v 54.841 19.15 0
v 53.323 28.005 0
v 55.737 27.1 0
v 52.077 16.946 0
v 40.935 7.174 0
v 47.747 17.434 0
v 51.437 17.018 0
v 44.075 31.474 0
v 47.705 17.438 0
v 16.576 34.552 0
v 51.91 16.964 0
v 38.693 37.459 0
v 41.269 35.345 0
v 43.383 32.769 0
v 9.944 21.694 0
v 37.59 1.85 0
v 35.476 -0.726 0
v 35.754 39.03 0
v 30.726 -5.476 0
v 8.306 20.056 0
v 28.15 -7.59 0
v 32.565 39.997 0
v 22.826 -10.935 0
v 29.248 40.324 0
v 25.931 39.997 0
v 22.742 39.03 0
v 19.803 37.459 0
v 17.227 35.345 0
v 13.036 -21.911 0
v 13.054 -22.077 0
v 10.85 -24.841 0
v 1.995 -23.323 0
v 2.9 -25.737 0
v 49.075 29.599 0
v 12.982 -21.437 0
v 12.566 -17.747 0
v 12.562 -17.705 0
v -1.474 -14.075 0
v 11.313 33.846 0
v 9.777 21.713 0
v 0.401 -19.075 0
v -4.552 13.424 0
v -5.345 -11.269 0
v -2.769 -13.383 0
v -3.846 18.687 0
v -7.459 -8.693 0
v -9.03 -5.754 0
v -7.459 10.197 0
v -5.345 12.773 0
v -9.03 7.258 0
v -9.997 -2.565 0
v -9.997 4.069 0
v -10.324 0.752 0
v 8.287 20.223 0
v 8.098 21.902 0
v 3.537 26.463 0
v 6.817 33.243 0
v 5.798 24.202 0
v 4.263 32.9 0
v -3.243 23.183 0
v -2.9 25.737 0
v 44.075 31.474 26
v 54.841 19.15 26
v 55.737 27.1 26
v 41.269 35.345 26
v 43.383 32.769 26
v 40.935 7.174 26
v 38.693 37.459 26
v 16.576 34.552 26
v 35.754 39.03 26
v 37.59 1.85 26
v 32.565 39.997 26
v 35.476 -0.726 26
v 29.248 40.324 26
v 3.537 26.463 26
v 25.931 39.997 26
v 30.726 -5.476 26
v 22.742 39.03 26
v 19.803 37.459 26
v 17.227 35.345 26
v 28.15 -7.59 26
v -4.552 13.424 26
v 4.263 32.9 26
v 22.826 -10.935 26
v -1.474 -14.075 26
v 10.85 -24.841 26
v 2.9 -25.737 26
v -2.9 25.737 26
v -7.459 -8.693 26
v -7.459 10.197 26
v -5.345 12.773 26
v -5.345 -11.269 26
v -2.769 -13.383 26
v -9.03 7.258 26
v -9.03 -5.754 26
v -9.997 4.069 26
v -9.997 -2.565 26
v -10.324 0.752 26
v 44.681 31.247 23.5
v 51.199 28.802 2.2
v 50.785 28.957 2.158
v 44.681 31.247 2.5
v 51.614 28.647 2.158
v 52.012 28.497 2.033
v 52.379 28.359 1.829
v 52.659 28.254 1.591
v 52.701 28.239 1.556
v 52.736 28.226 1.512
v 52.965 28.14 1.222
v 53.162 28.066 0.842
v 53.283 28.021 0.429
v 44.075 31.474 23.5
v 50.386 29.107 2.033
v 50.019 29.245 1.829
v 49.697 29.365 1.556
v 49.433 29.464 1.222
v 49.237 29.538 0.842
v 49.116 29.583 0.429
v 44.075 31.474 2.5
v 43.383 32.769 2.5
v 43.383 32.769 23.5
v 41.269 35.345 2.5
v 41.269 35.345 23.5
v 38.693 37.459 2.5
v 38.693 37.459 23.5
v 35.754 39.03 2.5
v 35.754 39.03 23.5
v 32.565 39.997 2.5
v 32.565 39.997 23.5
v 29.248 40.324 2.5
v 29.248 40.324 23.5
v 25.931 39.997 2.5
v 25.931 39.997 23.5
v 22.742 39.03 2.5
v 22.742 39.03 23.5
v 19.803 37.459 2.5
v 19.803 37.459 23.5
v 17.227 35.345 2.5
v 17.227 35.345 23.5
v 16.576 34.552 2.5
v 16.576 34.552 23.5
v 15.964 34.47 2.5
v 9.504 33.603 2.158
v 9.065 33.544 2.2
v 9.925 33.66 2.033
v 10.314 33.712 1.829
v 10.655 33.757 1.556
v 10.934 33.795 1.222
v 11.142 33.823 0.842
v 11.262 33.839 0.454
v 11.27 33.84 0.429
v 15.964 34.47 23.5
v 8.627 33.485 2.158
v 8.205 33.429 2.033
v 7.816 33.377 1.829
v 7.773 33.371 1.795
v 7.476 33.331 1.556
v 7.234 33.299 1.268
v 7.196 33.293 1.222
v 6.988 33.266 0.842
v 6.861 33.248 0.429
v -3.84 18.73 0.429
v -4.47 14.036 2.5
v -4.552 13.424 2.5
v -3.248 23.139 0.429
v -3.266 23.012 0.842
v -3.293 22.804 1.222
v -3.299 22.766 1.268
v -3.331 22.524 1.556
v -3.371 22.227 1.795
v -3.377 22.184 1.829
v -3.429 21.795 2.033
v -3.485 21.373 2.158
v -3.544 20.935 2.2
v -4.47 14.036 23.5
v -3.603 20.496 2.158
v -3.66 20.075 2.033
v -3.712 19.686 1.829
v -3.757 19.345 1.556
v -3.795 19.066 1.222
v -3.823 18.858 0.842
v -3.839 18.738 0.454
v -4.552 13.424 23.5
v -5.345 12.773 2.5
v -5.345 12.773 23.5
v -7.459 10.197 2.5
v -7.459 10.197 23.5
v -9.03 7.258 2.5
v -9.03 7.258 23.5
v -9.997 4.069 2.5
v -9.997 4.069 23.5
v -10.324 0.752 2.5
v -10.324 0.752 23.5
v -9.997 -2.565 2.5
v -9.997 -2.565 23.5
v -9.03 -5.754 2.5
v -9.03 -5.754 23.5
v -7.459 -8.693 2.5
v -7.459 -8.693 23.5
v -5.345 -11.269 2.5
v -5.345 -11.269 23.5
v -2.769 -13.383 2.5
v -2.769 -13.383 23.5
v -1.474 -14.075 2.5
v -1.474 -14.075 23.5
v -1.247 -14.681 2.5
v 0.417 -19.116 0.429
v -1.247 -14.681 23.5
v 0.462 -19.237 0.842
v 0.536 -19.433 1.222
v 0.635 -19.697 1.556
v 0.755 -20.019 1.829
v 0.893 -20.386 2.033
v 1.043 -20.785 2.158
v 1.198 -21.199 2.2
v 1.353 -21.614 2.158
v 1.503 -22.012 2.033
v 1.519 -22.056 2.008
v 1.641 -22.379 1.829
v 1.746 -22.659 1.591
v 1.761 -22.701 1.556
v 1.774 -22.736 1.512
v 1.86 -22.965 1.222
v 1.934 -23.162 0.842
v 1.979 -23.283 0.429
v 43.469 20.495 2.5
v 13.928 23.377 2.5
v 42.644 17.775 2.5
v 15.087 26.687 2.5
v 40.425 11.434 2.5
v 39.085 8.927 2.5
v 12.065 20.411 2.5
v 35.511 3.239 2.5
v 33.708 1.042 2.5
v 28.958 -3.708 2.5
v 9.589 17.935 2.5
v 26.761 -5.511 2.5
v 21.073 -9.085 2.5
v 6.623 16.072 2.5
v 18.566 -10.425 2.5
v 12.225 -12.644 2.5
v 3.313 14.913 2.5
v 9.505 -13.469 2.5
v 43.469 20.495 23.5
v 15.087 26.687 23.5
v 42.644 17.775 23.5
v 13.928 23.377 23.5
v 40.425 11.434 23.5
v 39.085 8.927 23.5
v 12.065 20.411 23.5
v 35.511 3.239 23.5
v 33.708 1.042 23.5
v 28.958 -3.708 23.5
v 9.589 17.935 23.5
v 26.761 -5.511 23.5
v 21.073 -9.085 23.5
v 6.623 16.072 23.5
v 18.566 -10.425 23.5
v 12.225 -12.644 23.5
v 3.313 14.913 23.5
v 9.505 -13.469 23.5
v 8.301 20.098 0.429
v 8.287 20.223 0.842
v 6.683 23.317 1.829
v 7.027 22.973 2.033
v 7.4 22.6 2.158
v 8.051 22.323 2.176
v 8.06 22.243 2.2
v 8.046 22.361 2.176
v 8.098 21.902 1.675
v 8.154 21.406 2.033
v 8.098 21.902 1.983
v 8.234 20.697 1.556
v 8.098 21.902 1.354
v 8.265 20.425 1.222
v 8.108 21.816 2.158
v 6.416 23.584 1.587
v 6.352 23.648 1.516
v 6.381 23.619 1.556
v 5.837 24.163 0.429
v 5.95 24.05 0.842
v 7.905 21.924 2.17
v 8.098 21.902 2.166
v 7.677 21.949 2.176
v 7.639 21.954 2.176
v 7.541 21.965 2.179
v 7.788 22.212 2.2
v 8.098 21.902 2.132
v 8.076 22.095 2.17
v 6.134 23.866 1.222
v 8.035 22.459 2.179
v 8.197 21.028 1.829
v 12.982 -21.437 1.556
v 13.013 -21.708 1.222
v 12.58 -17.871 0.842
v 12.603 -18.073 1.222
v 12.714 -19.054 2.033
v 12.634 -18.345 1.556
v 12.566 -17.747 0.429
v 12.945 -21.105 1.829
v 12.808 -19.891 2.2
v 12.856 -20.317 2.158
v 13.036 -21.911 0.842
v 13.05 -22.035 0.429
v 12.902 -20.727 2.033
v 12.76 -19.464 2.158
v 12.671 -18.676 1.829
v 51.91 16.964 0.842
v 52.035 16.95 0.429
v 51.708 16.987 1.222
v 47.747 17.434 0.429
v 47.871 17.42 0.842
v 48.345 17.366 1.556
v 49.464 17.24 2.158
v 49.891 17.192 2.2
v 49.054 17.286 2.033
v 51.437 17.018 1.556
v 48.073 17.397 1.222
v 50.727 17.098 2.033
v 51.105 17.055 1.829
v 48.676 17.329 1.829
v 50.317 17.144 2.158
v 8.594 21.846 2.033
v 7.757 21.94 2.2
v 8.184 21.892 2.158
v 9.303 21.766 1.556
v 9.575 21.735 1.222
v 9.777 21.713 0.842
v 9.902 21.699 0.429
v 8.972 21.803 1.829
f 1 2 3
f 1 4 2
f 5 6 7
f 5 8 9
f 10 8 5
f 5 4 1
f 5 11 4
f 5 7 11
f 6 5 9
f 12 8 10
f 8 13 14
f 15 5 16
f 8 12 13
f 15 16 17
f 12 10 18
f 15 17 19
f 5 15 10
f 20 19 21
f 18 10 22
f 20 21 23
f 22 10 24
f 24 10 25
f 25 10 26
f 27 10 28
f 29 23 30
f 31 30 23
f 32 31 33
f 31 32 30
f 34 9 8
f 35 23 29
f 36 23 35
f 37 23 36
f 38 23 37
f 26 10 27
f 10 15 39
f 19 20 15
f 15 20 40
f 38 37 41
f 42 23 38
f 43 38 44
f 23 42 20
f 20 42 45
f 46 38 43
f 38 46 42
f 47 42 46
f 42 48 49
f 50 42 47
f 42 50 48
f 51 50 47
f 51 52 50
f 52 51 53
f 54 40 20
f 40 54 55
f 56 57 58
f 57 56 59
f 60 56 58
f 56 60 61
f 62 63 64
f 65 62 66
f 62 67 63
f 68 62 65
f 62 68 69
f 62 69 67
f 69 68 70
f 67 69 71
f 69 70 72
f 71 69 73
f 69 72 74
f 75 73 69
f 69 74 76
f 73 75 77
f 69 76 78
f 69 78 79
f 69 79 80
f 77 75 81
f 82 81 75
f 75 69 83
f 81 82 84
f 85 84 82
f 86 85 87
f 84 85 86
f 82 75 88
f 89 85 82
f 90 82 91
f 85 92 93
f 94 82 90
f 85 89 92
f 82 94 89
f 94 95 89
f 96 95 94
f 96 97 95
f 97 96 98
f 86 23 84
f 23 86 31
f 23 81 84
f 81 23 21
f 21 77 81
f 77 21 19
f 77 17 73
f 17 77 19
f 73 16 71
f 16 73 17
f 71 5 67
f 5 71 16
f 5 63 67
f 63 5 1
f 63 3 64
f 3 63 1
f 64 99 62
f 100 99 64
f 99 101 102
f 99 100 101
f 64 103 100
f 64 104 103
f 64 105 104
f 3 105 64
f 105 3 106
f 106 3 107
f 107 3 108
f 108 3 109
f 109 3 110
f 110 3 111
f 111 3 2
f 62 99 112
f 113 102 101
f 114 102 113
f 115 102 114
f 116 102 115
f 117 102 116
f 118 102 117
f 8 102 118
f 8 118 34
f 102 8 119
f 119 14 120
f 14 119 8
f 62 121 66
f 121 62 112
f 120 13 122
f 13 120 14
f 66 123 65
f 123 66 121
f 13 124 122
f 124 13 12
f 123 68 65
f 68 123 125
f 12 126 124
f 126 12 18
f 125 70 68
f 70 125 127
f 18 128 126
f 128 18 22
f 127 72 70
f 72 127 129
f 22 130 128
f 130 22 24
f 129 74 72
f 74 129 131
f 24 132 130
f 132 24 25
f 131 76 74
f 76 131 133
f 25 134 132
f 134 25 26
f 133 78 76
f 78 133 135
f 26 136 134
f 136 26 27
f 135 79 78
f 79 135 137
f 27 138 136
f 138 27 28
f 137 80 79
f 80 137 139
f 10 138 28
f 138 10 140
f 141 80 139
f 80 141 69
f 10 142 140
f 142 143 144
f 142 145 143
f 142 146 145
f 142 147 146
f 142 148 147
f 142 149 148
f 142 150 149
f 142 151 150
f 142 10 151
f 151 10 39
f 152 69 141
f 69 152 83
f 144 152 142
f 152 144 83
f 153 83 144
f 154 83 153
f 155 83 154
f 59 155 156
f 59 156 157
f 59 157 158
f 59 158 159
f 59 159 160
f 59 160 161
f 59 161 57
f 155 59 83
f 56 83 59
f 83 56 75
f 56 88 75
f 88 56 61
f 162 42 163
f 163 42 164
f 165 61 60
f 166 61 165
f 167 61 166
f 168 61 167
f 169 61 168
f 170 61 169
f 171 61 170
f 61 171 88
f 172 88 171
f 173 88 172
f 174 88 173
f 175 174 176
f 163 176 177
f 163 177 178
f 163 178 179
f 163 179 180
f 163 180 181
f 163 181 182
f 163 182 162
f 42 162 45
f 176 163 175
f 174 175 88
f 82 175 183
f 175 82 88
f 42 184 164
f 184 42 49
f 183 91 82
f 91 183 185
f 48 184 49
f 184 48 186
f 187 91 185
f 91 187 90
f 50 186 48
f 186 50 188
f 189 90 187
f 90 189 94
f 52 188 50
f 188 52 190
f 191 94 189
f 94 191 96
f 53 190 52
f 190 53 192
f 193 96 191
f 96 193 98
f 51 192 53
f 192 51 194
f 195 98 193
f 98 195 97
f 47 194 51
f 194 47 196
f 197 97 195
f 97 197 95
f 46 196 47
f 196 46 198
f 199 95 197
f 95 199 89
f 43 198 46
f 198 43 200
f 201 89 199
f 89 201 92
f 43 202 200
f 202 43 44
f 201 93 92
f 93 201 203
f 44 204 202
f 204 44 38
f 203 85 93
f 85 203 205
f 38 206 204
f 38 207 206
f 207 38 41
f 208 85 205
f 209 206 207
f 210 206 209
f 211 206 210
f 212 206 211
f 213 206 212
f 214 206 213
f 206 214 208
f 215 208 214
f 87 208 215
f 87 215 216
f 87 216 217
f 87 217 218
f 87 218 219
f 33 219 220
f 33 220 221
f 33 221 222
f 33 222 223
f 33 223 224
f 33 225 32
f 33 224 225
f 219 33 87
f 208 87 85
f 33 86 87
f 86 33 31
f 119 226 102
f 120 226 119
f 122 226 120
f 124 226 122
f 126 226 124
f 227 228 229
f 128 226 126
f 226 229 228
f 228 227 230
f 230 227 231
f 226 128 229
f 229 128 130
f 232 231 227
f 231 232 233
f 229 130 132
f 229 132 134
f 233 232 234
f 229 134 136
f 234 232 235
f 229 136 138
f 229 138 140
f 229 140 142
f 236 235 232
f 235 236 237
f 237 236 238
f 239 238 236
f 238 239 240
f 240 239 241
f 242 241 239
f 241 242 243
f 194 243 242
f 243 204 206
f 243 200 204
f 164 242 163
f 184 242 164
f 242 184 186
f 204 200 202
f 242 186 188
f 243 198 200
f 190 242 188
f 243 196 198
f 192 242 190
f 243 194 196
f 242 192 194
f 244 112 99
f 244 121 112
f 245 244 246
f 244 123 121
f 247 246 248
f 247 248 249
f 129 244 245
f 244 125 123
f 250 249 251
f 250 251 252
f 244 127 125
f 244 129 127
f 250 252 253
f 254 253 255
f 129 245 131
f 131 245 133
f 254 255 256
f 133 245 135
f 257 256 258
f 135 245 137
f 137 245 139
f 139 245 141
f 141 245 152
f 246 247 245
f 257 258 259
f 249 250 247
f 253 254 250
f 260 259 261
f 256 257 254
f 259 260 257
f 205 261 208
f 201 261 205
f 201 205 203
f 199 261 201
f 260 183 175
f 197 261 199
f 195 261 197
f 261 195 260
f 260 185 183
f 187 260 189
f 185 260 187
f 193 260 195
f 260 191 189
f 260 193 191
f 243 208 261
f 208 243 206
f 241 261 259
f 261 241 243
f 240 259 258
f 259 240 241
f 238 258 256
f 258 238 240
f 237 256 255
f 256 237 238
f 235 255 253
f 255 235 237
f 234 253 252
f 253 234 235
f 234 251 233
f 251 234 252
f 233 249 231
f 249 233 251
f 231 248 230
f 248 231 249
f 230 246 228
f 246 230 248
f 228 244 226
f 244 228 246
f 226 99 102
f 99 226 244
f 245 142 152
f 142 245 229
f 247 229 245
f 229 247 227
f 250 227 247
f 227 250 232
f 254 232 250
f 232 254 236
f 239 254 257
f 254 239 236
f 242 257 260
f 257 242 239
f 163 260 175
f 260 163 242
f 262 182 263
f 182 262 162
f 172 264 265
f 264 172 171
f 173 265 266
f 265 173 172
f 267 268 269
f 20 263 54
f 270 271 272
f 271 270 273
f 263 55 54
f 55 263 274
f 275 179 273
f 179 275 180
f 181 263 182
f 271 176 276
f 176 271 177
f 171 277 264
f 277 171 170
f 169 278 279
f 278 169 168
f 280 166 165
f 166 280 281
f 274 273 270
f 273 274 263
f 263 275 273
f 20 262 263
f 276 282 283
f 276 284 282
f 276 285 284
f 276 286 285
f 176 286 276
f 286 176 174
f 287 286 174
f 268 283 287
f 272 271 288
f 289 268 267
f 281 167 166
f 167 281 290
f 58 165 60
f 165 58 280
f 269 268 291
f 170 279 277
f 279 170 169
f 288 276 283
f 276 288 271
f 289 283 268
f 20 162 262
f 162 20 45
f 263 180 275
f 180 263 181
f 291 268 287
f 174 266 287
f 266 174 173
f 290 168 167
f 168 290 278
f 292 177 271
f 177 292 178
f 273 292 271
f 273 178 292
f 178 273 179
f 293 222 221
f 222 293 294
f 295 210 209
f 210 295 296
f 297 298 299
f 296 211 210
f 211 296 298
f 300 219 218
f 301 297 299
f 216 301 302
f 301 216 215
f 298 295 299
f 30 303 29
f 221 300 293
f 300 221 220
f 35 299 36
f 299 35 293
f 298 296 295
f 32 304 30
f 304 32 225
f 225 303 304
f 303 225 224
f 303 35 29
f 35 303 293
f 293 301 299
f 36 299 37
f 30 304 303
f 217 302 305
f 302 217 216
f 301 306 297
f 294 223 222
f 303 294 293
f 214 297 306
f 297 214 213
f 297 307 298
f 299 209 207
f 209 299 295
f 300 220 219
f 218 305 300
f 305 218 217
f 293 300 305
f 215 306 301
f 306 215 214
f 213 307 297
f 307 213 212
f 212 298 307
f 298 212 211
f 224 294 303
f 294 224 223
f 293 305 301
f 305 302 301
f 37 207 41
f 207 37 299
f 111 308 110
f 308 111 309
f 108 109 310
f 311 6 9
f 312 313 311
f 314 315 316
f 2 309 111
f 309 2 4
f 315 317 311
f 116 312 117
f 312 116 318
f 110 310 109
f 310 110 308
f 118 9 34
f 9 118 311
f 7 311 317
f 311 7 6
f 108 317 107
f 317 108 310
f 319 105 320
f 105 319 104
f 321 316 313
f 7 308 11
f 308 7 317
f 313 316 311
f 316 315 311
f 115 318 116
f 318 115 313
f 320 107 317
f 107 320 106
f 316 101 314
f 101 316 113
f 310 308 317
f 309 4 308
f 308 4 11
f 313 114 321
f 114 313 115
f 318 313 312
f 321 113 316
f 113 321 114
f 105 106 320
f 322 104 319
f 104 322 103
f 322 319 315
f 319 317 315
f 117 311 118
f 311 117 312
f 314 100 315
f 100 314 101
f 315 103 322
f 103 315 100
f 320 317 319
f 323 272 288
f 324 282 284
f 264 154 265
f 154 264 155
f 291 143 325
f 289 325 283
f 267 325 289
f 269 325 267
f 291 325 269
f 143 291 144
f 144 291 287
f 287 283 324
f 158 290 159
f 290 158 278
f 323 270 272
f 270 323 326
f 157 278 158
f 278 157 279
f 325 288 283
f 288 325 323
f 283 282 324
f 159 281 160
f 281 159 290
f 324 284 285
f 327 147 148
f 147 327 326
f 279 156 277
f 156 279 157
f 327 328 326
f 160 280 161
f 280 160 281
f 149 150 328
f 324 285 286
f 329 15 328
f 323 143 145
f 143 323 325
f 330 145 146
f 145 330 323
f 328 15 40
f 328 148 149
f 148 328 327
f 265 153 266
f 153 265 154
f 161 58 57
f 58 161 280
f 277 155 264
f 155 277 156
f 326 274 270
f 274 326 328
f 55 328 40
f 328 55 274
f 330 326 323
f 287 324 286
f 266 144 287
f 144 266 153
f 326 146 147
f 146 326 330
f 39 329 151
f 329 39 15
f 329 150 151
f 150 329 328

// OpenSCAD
$fn = 32;

// ----------------------------------------------------------------------
// Air duct: 34 mm duct, 2.5 mm wall, 26 mm across
// ----------------------------------------------------------------------

// --- parameters (mm) ---
duct_r = 17;              // duct core radius
duct_d = 34;              // duct core diameter
wall = 2.5;               // duct wall thickness
height = 26;              // duct width (extrusion height)
port_r = 25.9;            // port flange half width
port_d = 51.8;            // port flange width
port_t = 8;               // port flange thickness
bolt_d = 4.4;             // port bolt holes
bolt_offset = 21.2;       // bolt hole offset from the port axis

difference() {
  /* outer hull chain: tube with a flat flange plate at every port */
  linear_extrude(height = 26) {
    hull() {
      polygon([[2.9, -25.737], [-2.9, 25.737], [5.05, 26.633], [10.85, -24.841]]);
      translate([10.931, 1.232]) circle(r = 17);
    }
    hull() {
      translate([10.931, 1.232]) circle(r = 17);
      translate([6.676, 0.752]) circle(r = 17);
    }
    hull() {
      translate([6.676, 0.752]) circle(r = 17);
      translate([13.017, 2.971]) circle(r = 17);
    }
    hull() {
      translate([13.017, 2.971]) circle(r = 17);
      translate([18.705, 6.545]) circle(r = 17);
    }
    hull() {
      translate([18.705, 6.545]) circle(r = 17);
      translate([23.455, 11.295]) circle(r = 17);
    }
    hull() {
      translate([23.455, 11.295]) circle(r = 17);
      translate([27.029, 16.983]) circle(r = 17);
    }
    hull() {
      translate([27.029, 16.983]) circle(r = 17);
      translate([29.248, 23.324]) circle(r = 17);
    }
    hull() {
      translate([29.248, 23.324]) circle(r = 17);
      translate([28.768, 19.069]) circle(r = 17);
    }
    hull() {
      translate([28.768, 19.069]) circle(r = 17);
      polygon([[4.263, 32.9], [55.737, 27.1], [54.841, 19.15], [3.367, 24.95]]);
    }
  }
  /* air passage: the same chain inset by the wall, 5 mm proud of the ports */
  translate([0, 0, 2.5]) linear_extrude(height = 21) {
    hull() {
      translate([-4.969, -0.56]) circle(r = 14.5);
      translate([6.676, 0.752]) circle(r = 14.5);
    }
    hull() {
      translate([6.676, 0.752]) circle(r = 14.5);
      translate([13.017, 2.971]) circle(r = 14.5);
    }
    hull() {
      translate([13.017, 2.971]) circle(r = 14.5);
      translate([18.705, 6.545]) circle(r = 14.5);
    }
    hull() {
      translate([18.705, 6.545]) circle(r = 14.5);
      translate([23.455, 11.295]) circle(r = 14.5);
    }
    hull() {
      translate([23.455, 11.295]) circle(r = 14.5);
      translate([27.029, 16.983]) circle(r = 14.5);
    }
    hull() {
      translate([27.029, 16.983]) circle(r = 14.5);
      translate([29.248, 23.324]) circle(r = 14.5);
    }
    hull() {
      translate([29.248, 23.324]) circle(r = 14.5);
      translate([30.56, 34.969]) circle(r = 14.5);
    }
  }
  translate([0, 0]) rotate([0, 0, -83.57]) translate([-21.2, -2.5]) rotate([-90, 0, 0]) cylinder(h = 13, d = 4.4);
  translate([0, 0]) rotate([0, 0, -83.57]) translate([21.2, -2.5]) rotate([-90, 0, 0]) cylinder(h = 13, d = 4.4);
  translate([30, 30]) rotate([0, 0, 173.57]) translate([-21.2, -2.5]) rotate([-90, 0, 0]) cylinder(h = 13, d = 4.4);
  translate([30, 30]) rotate([0, 0, 173.57]) translate([21.2, -2.5]) rotate([-90, 0, 0]) cylinder(h = 13, d = 4.4);
}
